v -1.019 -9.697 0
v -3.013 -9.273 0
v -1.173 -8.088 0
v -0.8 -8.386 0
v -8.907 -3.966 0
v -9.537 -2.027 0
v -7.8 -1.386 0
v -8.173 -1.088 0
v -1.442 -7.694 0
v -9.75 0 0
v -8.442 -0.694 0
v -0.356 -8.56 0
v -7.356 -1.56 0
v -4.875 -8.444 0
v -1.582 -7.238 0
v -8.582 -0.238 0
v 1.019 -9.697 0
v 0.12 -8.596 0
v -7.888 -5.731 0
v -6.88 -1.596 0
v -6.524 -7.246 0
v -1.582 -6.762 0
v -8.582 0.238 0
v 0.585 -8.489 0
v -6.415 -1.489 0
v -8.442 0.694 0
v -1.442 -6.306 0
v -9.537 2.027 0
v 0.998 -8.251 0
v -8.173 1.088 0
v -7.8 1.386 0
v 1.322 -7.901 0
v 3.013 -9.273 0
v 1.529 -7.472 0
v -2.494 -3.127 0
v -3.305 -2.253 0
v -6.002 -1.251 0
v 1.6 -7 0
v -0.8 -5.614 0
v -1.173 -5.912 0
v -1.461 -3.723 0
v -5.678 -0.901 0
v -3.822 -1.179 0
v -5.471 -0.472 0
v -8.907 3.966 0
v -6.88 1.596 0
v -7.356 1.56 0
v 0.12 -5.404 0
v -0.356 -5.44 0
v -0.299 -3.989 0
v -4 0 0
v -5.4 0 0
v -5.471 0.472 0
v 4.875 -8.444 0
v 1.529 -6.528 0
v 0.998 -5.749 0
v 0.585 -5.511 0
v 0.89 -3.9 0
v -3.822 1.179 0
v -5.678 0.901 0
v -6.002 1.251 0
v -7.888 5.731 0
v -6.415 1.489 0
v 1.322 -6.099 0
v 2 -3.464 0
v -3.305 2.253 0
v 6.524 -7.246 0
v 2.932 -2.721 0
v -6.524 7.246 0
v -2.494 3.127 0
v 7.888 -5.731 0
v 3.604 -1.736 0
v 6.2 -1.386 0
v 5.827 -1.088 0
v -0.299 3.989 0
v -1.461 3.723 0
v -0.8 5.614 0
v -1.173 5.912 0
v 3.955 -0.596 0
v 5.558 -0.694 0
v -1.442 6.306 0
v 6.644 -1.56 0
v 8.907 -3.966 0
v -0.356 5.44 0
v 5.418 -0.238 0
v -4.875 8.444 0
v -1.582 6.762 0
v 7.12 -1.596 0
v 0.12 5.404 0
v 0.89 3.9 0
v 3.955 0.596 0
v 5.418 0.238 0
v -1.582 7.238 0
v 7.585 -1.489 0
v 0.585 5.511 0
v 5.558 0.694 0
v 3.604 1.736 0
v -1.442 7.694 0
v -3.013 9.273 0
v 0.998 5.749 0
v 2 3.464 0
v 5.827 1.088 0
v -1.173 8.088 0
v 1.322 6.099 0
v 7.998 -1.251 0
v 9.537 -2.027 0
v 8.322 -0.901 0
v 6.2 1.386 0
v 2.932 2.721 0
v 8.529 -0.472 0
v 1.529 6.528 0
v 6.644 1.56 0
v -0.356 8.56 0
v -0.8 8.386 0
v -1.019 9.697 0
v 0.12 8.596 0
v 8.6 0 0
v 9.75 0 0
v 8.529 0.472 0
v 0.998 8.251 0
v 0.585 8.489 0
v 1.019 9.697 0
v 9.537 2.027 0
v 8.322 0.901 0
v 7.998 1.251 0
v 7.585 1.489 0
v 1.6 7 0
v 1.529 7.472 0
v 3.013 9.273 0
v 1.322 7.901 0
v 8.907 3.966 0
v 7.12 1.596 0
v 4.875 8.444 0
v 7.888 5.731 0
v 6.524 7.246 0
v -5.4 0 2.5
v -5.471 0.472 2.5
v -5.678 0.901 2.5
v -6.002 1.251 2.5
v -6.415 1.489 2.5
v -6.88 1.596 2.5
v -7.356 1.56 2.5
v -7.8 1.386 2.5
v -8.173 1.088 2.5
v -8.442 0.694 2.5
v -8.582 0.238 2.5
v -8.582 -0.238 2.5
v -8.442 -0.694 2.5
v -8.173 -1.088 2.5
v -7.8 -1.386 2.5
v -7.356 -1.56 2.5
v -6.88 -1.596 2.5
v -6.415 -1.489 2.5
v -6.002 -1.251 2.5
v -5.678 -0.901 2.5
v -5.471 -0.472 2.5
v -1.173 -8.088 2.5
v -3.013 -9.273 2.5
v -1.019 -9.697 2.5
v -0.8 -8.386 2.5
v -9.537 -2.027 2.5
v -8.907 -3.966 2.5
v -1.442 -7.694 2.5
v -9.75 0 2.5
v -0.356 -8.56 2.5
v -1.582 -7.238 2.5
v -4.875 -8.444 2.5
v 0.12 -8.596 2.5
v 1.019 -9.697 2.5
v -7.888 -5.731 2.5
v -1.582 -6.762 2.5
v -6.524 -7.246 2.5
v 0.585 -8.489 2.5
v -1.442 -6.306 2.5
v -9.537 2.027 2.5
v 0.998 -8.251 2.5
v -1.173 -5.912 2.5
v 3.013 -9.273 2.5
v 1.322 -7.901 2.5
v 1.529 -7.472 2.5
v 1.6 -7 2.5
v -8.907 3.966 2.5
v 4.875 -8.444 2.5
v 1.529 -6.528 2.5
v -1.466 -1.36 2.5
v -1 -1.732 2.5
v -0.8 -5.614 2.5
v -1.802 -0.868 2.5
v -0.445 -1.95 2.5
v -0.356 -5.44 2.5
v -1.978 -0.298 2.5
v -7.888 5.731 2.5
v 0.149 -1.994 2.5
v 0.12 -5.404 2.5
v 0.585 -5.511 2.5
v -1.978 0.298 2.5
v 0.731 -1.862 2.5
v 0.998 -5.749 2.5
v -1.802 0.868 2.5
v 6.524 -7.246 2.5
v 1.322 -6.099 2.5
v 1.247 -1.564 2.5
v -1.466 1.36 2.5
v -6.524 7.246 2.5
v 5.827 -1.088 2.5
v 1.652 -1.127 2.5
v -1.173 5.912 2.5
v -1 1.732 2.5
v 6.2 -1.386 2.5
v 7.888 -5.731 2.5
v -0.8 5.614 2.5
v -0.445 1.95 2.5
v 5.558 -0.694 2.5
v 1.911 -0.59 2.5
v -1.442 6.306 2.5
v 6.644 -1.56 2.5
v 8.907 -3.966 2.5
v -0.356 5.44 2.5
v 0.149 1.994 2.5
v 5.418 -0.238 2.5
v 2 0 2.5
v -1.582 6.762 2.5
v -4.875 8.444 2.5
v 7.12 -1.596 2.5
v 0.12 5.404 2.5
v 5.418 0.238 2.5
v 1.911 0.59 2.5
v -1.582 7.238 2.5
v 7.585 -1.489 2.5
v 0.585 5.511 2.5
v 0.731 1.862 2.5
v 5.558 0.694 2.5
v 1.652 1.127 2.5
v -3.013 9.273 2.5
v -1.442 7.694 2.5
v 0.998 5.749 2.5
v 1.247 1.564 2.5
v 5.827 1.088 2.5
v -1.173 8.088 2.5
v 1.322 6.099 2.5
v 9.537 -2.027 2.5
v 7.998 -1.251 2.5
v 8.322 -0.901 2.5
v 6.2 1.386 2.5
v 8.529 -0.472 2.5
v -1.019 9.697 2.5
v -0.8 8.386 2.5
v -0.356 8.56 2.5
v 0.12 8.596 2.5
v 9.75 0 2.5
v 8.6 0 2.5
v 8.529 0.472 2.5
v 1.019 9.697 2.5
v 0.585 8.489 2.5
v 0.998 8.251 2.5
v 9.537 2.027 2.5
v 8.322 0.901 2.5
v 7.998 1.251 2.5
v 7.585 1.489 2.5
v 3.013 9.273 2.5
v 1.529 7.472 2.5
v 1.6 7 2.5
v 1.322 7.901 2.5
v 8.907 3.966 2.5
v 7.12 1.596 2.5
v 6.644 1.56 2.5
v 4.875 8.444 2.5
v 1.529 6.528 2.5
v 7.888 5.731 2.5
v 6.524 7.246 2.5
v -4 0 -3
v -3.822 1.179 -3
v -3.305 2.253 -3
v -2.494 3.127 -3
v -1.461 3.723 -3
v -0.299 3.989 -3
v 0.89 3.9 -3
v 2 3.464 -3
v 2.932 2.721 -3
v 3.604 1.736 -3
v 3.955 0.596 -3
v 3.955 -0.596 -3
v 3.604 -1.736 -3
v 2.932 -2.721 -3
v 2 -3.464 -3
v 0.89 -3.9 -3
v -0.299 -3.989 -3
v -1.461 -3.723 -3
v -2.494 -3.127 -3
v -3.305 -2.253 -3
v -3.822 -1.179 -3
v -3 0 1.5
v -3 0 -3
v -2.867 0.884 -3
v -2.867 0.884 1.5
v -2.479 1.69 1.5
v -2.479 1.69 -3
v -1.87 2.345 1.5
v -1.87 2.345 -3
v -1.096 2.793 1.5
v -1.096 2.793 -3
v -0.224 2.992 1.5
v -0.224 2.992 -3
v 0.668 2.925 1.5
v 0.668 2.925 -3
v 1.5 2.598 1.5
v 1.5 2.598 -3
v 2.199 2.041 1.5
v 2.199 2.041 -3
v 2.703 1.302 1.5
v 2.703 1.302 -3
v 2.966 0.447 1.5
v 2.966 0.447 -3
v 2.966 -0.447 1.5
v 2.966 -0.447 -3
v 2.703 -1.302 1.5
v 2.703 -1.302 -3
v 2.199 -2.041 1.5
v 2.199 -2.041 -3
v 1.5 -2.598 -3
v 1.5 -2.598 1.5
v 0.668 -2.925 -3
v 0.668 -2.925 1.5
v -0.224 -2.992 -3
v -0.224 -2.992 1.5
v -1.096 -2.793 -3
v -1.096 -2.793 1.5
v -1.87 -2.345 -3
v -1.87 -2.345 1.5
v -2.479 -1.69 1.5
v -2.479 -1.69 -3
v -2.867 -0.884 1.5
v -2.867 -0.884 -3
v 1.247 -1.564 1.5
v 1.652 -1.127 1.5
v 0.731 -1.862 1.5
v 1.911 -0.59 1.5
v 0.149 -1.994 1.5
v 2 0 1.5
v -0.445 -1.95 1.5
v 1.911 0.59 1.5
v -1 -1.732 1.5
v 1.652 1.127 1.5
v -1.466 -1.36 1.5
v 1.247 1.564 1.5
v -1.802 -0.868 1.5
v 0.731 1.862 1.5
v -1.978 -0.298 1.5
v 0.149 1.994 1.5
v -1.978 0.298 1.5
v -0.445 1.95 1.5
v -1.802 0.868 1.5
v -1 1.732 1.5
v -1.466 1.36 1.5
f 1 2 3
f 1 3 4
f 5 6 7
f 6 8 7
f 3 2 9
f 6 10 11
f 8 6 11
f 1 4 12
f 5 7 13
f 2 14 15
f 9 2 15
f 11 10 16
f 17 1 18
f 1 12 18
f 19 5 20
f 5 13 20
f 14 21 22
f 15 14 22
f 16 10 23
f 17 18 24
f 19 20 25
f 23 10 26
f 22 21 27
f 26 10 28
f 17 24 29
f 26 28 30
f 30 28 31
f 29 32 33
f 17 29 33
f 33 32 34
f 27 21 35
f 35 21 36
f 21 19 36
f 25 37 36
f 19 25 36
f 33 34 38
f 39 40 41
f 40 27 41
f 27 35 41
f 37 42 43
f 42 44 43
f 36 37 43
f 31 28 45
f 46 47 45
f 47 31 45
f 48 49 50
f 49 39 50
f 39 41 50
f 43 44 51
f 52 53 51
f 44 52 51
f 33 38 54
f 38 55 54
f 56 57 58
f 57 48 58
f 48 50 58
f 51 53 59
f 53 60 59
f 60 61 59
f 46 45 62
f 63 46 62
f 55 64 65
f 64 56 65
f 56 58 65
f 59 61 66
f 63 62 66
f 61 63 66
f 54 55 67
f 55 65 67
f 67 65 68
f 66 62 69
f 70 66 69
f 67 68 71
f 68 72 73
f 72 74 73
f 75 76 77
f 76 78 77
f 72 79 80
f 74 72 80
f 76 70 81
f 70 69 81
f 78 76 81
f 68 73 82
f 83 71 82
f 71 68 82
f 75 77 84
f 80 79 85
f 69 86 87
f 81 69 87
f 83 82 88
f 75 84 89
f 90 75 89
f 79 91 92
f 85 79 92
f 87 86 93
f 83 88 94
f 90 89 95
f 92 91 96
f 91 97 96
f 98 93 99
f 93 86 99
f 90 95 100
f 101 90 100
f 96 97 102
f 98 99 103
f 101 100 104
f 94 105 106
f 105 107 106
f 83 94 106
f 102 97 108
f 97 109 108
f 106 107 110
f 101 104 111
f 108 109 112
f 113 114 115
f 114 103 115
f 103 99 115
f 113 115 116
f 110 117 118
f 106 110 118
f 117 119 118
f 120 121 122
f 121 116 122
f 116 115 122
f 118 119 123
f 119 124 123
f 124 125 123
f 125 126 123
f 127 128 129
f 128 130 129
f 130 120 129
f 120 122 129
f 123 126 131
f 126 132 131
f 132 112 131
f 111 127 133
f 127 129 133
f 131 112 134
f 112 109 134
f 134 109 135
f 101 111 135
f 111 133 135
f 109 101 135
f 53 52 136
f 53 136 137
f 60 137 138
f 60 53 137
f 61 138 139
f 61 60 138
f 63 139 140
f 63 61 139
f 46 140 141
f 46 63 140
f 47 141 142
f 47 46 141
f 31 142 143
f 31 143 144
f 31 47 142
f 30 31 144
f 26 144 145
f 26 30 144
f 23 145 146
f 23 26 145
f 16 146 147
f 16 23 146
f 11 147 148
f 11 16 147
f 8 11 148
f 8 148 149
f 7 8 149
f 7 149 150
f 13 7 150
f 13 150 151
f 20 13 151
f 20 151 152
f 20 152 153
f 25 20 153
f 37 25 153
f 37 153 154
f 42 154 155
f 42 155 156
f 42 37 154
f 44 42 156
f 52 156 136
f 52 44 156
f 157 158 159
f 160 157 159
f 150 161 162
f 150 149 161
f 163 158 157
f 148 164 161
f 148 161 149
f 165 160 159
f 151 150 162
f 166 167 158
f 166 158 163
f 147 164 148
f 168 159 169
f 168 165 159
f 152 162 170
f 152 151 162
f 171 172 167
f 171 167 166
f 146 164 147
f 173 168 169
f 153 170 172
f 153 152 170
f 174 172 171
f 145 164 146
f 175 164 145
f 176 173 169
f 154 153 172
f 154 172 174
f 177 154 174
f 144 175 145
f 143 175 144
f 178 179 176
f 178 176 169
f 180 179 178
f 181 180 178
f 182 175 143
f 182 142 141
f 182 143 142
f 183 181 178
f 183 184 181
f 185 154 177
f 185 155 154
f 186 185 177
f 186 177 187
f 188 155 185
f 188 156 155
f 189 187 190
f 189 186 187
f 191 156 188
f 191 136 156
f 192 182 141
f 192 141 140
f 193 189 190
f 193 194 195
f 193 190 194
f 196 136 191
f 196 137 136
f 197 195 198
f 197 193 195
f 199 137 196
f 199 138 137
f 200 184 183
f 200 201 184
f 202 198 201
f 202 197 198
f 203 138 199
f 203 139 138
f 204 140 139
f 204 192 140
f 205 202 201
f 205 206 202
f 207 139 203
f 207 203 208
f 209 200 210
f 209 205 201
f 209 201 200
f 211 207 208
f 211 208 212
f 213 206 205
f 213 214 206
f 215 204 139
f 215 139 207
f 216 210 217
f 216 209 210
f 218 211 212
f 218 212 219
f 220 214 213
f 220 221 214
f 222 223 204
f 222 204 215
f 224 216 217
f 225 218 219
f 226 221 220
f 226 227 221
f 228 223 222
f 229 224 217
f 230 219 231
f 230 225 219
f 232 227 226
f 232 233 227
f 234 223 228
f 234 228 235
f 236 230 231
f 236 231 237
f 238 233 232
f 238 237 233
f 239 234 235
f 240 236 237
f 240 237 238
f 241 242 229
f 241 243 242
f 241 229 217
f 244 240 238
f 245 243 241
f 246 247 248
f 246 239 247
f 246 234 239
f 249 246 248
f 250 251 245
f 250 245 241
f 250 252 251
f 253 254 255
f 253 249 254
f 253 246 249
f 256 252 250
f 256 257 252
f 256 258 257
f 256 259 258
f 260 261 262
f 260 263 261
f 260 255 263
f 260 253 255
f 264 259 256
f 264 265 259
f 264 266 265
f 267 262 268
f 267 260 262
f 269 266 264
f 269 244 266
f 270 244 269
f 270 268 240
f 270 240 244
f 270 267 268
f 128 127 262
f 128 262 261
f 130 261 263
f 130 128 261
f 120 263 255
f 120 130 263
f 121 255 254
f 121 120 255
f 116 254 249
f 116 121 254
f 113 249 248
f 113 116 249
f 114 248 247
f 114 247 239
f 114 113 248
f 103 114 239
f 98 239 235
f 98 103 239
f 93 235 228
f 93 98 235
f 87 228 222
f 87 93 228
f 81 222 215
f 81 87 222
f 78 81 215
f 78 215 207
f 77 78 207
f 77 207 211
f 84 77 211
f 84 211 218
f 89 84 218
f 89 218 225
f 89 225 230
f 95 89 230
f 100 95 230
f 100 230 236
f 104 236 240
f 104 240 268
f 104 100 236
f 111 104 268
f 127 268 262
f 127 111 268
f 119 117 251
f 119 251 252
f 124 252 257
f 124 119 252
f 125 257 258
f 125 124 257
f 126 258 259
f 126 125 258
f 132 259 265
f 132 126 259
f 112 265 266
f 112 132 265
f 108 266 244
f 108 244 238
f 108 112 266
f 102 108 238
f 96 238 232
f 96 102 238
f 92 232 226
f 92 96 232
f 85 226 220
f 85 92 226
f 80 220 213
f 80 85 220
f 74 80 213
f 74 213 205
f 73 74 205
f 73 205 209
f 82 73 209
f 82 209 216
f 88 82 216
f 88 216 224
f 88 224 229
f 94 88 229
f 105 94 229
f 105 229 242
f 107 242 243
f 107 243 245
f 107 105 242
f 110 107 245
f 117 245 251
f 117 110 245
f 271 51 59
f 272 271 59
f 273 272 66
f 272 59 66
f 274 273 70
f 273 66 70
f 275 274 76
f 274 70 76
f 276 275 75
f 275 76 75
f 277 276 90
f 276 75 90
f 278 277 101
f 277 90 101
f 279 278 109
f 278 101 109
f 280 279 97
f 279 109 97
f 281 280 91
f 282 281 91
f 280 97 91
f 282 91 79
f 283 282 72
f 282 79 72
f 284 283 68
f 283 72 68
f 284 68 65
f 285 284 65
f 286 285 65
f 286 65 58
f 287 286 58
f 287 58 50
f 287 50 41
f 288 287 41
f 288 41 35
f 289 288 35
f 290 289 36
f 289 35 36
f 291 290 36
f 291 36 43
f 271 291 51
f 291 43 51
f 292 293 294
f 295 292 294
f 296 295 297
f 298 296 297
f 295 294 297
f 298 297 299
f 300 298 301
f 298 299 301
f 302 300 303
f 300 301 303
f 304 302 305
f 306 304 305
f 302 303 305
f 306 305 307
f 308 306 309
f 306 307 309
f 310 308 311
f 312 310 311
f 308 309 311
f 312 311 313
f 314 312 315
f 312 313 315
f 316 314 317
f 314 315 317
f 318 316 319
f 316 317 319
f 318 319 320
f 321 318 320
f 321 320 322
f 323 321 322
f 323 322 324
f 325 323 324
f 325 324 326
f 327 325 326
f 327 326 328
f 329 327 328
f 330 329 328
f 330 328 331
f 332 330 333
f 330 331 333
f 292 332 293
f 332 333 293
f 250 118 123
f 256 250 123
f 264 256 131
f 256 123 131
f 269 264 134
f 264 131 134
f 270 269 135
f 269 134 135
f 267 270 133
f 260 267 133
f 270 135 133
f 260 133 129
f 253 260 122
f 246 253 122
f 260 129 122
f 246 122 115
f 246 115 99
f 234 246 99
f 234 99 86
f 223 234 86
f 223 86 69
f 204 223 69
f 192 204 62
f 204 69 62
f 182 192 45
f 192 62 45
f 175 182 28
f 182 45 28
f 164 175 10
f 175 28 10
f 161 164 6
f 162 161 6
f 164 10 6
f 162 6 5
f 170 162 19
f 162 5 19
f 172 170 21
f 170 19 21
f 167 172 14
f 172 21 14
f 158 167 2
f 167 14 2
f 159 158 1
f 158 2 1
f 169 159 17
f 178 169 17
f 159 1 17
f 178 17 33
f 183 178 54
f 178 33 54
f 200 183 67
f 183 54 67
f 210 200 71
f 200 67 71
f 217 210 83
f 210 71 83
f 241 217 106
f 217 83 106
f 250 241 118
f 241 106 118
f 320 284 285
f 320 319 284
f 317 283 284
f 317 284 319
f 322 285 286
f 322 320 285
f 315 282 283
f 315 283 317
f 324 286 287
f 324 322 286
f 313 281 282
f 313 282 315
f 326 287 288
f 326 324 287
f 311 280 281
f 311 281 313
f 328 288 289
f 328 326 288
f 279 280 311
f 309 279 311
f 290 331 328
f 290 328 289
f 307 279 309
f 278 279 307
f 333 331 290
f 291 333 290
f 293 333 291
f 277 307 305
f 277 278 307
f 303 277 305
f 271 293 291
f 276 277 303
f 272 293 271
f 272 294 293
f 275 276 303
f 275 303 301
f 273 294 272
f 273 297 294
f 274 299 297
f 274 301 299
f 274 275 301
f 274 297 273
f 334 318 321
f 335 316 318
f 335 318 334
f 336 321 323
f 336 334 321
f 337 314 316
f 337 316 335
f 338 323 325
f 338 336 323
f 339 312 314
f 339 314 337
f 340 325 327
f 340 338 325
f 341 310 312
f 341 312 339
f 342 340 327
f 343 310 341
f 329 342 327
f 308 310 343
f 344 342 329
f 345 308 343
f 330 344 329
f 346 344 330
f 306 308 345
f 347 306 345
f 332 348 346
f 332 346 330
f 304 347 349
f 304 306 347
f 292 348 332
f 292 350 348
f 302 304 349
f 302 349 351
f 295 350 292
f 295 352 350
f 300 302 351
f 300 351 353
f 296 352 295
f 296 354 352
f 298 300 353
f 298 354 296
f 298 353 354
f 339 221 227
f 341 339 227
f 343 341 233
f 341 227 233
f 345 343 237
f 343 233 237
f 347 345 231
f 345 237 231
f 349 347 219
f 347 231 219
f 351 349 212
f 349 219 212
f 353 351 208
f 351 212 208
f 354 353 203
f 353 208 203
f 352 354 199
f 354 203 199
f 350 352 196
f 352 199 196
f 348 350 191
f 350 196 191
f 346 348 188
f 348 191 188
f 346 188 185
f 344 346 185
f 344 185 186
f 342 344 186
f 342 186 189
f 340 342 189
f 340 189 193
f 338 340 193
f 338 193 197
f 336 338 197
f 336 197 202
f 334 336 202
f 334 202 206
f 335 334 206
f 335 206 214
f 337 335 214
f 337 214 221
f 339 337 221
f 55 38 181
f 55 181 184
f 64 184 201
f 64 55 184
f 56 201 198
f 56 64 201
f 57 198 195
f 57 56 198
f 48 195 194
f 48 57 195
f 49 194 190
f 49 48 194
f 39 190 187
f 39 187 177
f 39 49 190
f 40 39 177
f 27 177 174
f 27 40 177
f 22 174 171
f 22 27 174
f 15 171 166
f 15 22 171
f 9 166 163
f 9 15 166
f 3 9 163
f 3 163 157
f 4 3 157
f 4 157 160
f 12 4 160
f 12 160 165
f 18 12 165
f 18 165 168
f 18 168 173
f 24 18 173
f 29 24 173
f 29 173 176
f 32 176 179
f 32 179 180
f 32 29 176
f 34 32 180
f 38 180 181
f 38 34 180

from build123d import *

# Parameters (mm, degrees)
IZIM1_R                     = 9.75
IZIM1_R_2                   = 1.6
Y_KSEKLIK_EKSTR_ZYON4_DEPTH = 2.5
IZIM13_R                    = 4
Y_KSEKLIK_EKSTR_ZYON6_DEPTH = 3
IZIM14_R                    = 3
KES_EKSTR_ZYON4_DEPTH       = 4.5
IZIM15_R                    = 2
KES_EKSTR_ZYON5_DEPTH       = 2.5


with BuildPart() as part:
    # Çizim1 → Yükseklik-Ekstrüzyon4 (new body)
    with BuildSketch(Plane.XY):
        Circle(IZIM1_R)
        with Locations((-7, 0)):
            Circle(IZIM1_R_2, mode=Mode.SUBTRACT)
        with Locations((0, 7)):
            Circle(IZIM1_R_2, mode=Mode.SUBTRACT)
        with Locations((7, 0)):
            Circle(IZIM1_R_2, mode=Mode.SUBTRACT)
        with Locations((0, -7)):
            Circle(IZIM1_R_2, mode=Mode.SUBTRACT)
    extrude(amount=Y_KSEKLIK_EKSTR_ZYON4_DEPTH)

    # Çizim13 → Yükseklik-Ekstrüzyon6 (add)
    with BuildSketch(Plane(origin=(0, 0, 0), x_dir=(-1, 0, 0), z_dir=(0, 0, -1))):
        Circle(IZIM13_R)
    extrude(amount=Y_KSEKLIK_EKSTR_ZYON6_DEPTH)

    # Çizim14 → Kes-Ekstrüzyon4 (cut)
    with BuildSketch(Plane(origin=(0, 0, -3), x_dir=(-1, 0, 0), z_dir=(0, 0, -1))):
        Circle(IZIM14_R)
    extrude(amount=-KES_EKSTR_ZYON4_DEPTH, mode=Mode.SUBTRACT)

    # Çizim15 → Kes-Ekstrüzyon5 (cut)
    with BuildSketch(Plane.XY.offset(2.5)):
        Circle(IZIM15_R)
    extrude(amount=-KES_EKSTR_ZYON5_DEPTH, mode=Mode.SUBTRACT)


solid = part.part
